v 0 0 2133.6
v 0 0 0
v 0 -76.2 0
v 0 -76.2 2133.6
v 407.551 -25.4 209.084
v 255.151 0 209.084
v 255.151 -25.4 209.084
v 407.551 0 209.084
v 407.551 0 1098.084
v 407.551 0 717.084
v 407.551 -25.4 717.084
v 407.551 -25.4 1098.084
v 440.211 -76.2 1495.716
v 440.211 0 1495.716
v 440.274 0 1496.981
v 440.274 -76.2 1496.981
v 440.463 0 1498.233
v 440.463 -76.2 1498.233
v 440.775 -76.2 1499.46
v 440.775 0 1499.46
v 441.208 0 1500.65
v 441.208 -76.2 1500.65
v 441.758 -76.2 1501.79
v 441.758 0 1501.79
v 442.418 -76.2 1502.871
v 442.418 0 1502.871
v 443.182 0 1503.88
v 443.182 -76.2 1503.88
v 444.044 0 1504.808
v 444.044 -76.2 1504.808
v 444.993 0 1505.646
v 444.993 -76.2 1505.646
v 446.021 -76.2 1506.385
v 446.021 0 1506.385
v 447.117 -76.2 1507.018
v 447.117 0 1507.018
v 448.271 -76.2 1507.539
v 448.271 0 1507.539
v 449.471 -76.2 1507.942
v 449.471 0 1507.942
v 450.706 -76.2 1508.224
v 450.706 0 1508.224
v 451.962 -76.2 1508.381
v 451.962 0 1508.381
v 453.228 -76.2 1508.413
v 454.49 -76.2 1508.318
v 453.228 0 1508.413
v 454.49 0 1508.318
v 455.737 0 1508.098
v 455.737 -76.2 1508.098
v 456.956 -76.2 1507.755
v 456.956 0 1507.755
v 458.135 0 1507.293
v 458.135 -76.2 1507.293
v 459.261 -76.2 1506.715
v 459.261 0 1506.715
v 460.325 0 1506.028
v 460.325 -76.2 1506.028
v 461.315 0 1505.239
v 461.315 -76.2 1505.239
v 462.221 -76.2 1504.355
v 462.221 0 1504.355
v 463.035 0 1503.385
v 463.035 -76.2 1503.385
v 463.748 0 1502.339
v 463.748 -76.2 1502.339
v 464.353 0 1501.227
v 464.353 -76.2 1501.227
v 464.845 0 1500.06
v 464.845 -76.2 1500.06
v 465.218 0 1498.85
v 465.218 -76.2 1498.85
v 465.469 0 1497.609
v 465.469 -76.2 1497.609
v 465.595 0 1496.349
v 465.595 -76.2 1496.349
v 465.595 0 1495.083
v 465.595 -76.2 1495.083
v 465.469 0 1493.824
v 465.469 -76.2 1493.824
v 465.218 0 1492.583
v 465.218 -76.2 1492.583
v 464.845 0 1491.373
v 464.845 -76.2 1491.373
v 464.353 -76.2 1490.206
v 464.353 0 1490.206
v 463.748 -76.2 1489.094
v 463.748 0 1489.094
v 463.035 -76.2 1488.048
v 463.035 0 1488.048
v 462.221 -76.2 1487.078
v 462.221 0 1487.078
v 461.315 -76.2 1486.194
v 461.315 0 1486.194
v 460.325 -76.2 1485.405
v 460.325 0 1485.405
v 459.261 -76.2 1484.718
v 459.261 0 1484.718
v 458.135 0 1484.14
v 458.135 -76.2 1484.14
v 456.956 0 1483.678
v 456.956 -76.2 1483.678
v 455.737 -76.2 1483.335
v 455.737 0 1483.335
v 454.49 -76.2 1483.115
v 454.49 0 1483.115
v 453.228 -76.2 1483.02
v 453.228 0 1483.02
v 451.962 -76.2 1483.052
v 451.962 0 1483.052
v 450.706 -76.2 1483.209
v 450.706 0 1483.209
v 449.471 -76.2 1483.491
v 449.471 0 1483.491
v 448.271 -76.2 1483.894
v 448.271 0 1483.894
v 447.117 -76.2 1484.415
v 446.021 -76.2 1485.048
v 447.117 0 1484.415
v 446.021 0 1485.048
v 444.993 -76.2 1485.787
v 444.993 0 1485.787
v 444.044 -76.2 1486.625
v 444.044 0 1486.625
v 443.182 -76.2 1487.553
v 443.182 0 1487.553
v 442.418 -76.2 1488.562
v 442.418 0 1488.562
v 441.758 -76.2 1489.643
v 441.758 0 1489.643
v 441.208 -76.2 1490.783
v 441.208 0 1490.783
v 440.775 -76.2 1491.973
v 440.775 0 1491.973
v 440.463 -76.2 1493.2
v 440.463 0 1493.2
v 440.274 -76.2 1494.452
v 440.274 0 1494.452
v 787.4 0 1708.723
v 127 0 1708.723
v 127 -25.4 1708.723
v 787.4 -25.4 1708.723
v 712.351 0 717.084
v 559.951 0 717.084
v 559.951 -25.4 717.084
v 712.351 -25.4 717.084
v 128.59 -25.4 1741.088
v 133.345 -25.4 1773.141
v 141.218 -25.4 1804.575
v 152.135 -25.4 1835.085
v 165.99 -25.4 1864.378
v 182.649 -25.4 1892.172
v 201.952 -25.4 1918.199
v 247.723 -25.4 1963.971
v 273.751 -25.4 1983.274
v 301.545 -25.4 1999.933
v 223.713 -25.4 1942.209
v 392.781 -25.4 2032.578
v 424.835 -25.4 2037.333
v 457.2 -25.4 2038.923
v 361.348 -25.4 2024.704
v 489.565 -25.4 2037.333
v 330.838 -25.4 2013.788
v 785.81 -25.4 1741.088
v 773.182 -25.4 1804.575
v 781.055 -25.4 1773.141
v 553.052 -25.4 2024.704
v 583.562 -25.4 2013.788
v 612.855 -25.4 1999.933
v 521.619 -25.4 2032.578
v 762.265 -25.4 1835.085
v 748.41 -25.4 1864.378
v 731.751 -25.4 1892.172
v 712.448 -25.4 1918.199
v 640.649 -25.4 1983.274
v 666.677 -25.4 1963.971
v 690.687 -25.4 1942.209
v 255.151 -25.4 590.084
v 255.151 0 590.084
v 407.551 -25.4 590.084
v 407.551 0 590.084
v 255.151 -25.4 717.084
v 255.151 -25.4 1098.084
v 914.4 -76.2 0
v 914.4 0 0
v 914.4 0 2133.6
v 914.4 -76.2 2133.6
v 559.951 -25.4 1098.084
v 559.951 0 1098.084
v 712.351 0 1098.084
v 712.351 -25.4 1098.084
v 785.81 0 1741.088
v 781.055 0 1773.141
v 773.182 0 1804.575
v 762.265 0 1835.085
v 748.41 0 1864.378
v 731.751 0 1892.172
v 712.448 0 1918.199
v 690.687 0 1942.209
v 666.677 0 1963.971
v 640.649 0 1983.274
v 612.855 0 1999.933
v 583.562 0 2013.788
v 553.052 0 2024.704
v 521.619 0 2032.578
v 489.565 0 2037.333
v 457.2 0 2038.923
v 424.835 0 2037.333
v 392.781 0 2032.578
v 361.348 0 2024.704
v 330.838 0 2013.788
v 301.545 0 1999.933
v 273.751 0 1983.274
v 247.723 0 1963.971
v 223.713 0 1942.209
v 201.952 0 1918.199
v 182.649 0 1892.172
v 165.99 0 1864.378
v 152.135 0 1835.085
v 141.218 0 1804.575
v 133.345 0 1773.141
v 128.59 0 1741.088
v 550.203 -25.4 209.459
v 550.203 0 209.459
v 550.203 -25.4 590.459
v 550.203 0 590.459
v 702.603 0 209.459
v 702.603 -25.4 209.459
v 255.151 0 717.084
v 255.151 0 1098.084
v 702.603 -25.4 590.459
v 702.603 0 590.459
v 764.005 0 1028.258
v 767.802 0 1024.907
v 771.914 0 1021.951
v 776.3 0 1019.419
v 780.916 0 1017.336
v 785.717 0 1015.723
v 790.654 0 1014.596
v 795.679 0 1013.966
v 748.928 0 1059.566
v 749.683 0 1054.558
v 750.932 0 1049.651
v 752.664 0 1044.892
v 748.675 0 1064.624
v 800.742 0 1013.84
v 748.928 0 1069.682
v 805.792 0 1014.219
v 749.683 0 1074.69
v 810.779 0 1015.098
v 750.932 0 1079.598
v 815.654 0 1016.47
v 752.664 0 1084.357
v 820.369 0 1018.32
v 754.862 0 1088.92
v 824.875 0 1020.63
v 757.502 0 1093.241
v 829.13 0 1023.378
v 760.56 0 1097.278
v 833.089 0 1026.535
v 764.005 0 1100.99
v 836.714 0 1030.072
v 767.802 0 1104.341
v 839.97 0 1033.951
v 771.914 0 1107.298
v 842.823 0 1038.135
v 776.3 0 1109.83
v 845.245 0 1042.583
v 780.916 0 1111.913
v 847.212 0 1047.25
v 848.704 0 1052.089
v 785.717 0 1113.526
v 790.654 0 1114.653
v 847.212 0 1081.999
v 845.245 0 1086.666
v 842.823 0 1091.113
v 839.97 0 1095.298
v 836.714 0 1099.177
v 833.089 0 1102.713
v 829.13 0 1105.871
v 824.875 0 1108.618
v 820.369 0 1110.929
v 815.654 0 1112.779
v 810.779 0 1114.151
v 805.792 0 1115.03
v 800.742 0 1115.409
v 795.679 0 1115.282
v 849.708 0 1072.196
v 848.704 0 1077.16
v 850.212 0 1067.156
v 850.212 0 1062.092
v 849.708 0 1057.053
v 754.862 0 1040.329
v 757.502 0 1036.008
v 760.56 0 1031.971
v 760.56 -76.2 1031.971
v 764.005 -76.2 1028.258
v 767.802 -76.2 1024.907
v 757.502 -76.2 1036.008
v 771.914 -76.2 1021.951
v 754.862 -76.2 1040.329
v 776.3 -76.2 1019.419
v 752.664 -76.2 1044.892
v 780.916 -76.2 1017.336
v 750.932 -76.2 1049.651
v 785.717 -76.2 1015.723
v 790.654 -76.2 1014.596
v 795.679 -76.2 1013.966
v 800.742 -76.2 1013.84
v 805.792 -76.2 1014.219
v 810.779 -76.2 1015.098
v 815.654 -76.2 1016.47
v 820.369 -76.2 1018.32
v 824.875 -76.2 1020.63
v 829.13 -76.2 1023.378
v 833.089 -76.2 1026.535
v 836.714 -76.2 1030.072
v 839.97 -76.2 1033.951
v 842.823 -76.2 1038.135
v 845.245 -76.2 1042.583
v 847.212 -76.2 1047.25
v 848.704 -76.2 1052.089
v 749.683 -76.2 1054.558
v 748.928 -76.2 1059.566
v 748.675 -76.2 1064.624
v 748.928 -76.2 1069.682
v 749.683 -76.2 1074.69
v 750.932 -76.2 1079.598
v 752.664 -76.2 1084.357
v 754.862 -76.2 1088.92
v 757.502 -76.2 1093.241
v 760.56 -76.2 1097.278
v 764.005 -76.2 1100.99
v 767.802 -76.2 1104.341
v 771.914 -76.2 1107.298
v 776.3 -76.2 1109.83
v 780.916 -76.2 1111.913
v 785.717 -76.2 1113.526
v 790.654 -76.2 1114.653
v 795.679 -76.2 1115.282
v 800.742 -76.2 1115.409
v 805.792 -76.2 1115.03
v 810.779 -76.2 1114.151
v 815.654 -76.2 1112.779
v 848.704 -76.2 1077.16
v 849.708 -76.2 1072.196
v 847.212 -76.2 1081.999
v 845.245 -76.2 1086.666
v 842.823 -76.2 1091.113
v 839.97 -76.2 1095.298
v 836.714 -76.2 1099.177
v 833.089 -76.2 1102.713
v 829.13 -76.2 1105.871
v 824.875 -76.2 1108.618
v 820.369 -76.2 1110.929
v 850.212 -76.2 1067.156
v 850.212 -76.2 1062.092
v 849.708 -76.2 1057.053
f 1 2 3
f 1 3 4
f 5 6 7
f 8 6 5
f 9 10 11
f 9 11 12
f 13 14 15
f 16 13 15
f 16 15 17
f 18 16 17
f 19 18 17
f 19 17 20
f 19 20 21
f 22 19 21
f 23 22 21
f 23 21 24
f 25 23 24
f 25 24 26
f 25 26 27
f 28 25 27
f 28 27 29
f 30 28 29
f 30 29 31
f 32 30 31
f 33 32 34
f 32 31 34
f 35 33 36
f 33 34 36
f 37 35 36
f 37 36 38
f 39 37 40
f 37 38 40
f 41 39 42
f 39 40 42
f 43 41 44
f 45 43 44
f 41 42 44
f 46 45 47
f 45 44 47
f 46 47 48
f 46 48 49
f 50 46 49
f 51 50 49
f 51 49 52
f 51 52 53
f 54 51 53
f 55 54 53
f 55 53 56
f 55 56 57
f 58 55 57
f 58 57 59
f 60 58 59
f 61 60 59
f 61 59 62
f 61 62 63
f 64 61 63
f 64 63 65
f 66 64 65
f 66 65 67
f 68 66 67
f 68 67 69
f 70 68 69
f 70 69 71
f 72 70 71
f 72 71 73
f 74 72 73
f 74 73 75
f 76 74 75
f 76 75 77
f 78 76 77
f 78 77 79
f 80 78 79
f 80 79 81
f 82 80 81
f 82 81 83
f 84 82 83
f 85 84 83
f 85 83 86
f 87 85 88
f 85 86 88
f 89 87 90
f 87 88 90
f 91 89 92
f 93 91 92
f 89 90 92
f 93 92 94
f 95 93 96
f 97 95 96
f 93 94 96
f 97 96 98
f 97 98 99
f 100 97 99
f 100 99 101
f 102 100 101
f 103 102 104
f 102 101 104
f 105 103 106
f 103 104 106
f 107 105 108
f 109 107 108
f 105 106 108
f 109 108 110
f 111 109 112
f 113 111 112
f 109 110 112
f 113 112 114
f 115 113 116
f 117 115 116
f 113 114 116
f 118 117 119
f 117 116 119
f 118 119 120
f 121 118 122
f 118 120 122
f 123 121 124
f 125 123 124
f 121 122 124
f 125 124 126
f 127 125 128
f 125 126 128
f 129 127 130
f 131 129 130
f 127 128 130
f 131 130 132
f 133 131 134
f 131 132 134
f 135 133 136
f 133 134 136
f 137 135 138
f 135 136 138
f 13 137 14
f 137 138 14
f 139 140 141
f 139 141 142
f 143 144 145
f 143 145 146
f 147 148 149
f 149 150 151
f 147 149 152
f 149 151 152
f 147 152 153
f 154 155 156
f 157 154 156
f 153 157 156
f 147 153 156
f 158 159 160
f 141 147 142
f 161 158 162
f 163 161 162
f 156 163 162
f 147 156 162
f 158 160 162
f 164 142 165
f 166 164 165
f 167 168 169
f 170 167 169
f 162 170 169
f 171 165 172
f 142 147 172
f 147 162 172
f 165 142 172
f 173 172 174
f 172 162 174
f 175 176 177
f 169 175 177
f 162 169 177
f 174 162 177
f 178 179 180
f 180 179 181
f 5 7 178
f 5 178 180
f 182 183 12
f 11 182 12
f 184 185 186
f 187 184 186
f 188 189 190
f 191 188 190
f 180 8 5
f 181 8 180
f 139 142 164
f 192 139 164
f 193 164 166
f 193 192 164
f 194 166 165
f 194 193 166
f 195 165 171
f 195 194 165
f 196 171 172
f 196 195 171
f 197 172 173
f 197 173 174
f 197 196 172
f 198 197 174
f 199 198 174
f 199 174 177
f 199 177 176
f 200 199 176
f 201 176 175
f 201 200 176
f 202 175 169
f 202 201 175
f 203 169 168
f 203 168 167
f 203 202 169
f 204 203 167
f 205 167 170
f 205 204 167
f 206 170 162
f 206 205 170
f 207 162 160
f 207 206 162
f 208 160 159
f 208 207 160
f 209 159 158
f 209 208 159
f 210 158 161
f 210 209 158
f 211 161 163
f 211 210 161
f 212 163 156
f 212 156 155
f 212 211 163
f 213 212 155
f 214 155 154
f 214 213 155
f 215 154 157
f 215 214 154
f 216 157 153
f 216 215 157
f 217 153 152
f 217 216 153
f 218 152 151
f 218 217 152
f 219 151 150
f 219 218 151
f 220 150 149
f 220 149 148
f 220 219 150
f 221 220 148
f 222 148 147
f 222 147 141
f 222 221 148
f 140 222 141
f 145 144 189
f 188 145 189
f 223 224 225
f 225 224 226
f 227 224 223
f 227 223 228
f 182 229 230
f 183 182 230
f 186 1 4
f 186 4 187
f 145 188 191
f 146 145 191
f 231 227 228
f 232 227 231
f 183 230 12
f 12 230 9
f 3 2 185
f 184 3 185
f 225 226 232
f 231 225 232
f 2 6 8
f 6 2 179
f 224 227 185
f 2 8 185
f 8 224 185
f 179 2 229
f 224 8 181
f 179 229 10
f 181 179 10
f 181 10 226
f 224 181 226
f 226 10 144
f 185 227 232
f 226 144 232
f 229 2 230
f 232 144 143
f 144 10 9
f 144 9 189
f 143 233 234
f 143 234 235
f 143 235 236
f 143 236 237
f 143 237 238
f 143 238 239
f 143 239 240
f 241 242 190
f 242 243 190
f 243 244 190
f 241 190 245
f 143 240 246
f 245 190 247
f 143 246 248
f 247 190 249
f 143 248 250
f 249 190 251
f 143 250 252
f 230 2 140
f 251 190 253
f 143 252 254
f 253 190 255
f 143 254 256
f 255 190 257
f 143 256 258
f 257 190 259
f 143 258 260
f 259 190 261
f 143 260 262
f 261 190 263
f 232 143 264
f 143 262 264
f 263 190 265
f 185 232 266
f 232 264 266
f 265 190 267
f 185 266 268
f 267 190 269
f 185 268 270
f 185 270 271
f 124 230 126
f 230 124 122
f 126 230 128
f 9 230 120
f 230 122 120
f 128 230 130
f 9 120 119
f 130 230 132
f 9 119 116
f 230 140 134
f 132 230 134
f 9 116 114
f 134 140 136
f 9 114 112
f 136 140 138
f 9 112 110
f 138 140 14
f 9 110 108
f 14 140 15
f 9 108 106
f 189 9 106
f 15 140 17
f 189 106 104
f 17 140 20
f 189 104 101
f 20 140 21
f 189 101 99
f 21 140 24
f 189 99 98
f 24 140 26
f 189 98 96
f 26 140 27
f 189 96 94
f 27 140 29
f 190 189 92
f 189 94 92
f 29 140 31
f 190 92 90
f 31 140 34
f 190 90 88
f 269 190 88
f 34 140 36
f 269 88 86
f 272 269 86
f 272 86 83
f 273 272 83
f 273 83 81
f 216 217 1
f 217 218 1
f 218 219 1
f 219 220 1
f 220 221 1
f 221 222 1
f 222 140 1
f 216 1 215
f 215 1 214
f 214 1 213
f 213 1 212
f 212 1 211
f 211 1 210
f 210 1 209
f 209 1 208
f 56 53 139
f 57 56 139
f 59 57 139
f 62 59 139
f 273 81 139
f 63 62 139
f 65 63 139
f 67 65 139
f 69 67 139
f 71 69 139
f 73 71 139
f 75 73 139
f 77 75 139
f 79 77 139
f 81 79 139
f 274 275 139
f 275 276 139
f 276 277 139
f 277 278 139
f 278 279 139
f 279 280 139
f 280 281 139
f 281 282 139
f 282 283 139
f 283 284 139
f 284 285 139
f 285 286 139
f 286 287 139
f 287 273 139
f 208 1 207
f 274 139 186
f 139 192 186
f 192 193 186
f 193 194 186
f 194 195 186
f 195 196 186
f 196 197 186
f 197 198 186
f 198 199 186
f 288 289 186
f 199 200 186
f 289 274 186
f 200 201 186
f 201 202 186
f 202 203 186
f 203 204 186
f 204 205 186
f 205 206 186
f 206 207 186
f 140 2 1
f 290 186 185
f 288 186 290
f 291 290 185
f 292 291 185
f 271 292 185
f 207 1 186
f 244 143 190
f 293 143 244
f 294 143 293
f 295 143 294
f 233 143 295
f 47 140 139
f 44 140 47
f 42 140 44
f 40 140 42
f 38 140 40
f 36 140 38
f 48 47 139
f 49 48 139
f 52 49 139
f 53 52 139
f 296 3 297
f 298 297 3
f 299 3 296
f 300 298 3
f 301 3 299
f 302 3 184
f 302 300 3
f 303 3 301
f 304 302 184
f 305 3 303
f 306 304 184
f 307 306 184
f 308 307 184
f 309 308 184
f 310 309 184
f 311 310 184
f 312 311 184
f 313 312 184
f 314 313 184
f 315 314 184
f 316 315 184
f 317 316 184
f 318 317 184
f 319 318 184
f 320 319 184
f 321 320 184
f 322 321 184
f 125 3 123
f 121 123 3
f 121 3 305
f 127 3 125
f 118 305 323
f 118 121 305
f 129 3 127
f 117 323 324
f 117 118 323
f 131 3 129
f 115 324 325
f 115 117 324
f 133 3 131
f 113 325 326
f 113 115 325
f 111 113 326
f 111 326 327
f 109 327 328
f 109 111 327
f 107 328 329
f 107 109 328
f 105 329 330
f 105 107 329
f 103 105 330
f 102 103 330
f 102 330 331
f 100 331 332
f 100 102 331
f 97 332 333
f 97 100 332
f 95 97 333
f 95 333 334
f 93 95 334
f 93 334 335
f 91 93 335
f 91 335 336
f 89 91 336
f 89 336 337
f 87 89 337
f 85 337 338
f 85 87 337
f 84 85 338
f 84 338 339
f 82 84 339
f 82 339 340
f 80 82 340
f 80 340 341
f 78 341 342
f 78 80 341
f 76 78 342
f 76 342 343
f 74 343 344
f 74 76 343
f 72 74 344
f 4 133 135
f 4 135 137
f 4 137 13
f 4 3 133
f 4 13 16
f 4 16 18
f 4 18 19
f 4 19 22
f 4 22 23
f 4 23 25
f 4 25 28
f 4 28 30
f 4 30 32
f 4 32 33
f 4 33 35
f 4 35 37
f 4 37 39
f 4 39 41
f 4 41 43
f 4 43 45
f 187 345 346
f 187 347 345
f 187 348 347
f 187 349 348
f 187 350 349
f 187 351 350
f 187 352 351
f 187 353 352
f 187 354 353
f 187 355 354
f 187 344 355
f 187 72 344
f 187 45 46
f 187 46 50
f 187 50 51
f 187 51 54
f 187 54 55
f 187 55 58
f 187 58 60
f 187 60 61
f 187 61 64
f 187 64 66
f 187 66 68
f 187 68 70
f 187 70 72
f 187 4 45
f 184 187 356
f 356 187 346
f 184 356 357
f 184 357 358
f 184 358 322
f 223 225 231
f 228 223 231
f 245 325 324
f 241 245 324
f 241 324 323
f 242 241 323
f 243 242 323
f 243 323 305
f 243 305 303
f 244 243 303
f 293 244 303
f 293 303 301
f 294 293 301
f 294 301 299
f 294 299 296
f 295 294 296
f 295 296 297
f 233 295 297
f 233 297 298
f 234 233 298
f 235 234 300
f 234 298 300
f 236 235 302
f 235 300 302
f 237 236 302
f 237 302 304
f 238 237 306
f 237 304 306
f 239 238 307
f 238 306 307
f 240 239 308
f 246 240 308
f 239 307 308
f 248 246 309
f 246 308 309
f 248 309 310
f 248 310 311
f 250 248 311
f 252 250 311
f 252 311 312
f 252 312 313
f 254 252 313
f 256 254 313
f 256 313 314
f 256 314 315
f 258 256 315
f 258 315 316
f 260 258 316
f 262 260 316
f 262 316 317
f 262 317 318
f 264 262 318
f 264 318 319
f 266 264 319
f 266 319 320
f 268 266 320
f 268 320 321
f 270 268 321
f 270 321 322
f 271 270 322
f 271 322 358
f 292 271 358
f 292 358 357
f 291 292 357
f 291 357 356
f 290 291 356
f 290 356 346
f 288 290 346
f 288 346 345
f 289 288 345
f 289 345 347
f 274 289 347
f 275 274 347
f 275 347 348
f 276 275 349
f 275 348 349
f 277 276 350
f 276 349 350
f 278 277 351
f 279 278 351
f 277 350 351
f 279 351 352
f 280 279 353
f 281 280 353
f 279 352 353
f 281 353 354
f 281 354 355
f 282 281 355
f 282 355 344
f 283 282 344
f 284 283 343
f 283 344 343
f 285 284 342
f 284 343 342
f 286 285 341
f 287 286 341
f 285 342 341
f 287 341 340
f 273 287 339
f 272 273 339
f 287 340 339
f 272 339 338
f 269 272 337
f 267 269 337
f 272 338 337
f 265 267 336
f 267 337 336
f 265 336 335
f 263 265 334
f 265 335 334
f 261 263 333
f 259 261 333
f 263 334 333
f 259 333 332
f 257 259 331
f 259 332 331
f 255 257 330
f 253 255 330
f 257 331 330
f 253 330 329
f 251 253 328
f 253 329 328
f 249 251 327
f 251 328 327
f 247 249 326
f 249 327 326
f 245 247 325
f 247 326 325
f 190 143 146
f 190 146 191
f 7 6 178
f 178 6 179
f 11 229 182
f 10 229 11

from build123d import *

# Parameters (mm, degrees)
F0_W     = 914.4
F0_H     = 2133.6
F4_DEPTH = 76.2
F6_D     = 101.6
F7_D     = 25.4
F8_DEPTH = 25.4
F2_W     = 152.4
F2_H     = 381
F9_DEPTH = 25.4


with BuildPart() as f4:
    # F0 (on Front) → F4 (new body)
    with BuildSketch(Plane.XZ):
        with Locations((457.2, 1066.8)):
            Rectangle(F0_W, F0_H)
    extrude(amount=F4_DEPTH)

    # F6 (through all)
    with Locations(Plane(origin=(0, 0, 0), x_dir=(1, 0, 0), z_dir=(0, 1, 0))):
        with Locations((799.4753718376, -1064.6243095398)):
            Hole(F6_D / 2)

    # F7 (through all)
    with Locations(Plane.XZ.offset(76.2)):
        with Locations((452.9111683369, 1495.7164525986)):
            Hole(F7_D / 2)

    # F1 (on Front) → F8 (cut)
    with BuildSketch(Plane.XZ):
        with BuildLine():
            ThreePointArc((787.4, 1708.7225914001), (457.2, 2038.9225914001), (127, 1708.7225914001))
            Line((127, 1708.7225914001), (787.4, 1708.7225914001))
        make_face()
    extrude(amount=F8_DEPTH, mode=Mode.SUBTRACT)

    # F2 (on Front) → F9 (cut)
    with BuildSketch(Plane.XZ):
        with Locations((331.3514550252, 907.5841558799)):
            Rectangle(F2_W, F2_H)
        with Locations((636.1514550252, 907.5841558799)):
            Rectangle(F2_W, F2_H)
        with Locations((331.3514550252, 399.5841558799)):
            Rectangle(F2_W, F2_H)
        with Locations((626.4034242401, 399.9588191742)):
            Rectangle(F2_W, F2_H)
    extrude(amount=F9_DEPTH, mode=Mode.SUBTRACT)


solid = f4.part
